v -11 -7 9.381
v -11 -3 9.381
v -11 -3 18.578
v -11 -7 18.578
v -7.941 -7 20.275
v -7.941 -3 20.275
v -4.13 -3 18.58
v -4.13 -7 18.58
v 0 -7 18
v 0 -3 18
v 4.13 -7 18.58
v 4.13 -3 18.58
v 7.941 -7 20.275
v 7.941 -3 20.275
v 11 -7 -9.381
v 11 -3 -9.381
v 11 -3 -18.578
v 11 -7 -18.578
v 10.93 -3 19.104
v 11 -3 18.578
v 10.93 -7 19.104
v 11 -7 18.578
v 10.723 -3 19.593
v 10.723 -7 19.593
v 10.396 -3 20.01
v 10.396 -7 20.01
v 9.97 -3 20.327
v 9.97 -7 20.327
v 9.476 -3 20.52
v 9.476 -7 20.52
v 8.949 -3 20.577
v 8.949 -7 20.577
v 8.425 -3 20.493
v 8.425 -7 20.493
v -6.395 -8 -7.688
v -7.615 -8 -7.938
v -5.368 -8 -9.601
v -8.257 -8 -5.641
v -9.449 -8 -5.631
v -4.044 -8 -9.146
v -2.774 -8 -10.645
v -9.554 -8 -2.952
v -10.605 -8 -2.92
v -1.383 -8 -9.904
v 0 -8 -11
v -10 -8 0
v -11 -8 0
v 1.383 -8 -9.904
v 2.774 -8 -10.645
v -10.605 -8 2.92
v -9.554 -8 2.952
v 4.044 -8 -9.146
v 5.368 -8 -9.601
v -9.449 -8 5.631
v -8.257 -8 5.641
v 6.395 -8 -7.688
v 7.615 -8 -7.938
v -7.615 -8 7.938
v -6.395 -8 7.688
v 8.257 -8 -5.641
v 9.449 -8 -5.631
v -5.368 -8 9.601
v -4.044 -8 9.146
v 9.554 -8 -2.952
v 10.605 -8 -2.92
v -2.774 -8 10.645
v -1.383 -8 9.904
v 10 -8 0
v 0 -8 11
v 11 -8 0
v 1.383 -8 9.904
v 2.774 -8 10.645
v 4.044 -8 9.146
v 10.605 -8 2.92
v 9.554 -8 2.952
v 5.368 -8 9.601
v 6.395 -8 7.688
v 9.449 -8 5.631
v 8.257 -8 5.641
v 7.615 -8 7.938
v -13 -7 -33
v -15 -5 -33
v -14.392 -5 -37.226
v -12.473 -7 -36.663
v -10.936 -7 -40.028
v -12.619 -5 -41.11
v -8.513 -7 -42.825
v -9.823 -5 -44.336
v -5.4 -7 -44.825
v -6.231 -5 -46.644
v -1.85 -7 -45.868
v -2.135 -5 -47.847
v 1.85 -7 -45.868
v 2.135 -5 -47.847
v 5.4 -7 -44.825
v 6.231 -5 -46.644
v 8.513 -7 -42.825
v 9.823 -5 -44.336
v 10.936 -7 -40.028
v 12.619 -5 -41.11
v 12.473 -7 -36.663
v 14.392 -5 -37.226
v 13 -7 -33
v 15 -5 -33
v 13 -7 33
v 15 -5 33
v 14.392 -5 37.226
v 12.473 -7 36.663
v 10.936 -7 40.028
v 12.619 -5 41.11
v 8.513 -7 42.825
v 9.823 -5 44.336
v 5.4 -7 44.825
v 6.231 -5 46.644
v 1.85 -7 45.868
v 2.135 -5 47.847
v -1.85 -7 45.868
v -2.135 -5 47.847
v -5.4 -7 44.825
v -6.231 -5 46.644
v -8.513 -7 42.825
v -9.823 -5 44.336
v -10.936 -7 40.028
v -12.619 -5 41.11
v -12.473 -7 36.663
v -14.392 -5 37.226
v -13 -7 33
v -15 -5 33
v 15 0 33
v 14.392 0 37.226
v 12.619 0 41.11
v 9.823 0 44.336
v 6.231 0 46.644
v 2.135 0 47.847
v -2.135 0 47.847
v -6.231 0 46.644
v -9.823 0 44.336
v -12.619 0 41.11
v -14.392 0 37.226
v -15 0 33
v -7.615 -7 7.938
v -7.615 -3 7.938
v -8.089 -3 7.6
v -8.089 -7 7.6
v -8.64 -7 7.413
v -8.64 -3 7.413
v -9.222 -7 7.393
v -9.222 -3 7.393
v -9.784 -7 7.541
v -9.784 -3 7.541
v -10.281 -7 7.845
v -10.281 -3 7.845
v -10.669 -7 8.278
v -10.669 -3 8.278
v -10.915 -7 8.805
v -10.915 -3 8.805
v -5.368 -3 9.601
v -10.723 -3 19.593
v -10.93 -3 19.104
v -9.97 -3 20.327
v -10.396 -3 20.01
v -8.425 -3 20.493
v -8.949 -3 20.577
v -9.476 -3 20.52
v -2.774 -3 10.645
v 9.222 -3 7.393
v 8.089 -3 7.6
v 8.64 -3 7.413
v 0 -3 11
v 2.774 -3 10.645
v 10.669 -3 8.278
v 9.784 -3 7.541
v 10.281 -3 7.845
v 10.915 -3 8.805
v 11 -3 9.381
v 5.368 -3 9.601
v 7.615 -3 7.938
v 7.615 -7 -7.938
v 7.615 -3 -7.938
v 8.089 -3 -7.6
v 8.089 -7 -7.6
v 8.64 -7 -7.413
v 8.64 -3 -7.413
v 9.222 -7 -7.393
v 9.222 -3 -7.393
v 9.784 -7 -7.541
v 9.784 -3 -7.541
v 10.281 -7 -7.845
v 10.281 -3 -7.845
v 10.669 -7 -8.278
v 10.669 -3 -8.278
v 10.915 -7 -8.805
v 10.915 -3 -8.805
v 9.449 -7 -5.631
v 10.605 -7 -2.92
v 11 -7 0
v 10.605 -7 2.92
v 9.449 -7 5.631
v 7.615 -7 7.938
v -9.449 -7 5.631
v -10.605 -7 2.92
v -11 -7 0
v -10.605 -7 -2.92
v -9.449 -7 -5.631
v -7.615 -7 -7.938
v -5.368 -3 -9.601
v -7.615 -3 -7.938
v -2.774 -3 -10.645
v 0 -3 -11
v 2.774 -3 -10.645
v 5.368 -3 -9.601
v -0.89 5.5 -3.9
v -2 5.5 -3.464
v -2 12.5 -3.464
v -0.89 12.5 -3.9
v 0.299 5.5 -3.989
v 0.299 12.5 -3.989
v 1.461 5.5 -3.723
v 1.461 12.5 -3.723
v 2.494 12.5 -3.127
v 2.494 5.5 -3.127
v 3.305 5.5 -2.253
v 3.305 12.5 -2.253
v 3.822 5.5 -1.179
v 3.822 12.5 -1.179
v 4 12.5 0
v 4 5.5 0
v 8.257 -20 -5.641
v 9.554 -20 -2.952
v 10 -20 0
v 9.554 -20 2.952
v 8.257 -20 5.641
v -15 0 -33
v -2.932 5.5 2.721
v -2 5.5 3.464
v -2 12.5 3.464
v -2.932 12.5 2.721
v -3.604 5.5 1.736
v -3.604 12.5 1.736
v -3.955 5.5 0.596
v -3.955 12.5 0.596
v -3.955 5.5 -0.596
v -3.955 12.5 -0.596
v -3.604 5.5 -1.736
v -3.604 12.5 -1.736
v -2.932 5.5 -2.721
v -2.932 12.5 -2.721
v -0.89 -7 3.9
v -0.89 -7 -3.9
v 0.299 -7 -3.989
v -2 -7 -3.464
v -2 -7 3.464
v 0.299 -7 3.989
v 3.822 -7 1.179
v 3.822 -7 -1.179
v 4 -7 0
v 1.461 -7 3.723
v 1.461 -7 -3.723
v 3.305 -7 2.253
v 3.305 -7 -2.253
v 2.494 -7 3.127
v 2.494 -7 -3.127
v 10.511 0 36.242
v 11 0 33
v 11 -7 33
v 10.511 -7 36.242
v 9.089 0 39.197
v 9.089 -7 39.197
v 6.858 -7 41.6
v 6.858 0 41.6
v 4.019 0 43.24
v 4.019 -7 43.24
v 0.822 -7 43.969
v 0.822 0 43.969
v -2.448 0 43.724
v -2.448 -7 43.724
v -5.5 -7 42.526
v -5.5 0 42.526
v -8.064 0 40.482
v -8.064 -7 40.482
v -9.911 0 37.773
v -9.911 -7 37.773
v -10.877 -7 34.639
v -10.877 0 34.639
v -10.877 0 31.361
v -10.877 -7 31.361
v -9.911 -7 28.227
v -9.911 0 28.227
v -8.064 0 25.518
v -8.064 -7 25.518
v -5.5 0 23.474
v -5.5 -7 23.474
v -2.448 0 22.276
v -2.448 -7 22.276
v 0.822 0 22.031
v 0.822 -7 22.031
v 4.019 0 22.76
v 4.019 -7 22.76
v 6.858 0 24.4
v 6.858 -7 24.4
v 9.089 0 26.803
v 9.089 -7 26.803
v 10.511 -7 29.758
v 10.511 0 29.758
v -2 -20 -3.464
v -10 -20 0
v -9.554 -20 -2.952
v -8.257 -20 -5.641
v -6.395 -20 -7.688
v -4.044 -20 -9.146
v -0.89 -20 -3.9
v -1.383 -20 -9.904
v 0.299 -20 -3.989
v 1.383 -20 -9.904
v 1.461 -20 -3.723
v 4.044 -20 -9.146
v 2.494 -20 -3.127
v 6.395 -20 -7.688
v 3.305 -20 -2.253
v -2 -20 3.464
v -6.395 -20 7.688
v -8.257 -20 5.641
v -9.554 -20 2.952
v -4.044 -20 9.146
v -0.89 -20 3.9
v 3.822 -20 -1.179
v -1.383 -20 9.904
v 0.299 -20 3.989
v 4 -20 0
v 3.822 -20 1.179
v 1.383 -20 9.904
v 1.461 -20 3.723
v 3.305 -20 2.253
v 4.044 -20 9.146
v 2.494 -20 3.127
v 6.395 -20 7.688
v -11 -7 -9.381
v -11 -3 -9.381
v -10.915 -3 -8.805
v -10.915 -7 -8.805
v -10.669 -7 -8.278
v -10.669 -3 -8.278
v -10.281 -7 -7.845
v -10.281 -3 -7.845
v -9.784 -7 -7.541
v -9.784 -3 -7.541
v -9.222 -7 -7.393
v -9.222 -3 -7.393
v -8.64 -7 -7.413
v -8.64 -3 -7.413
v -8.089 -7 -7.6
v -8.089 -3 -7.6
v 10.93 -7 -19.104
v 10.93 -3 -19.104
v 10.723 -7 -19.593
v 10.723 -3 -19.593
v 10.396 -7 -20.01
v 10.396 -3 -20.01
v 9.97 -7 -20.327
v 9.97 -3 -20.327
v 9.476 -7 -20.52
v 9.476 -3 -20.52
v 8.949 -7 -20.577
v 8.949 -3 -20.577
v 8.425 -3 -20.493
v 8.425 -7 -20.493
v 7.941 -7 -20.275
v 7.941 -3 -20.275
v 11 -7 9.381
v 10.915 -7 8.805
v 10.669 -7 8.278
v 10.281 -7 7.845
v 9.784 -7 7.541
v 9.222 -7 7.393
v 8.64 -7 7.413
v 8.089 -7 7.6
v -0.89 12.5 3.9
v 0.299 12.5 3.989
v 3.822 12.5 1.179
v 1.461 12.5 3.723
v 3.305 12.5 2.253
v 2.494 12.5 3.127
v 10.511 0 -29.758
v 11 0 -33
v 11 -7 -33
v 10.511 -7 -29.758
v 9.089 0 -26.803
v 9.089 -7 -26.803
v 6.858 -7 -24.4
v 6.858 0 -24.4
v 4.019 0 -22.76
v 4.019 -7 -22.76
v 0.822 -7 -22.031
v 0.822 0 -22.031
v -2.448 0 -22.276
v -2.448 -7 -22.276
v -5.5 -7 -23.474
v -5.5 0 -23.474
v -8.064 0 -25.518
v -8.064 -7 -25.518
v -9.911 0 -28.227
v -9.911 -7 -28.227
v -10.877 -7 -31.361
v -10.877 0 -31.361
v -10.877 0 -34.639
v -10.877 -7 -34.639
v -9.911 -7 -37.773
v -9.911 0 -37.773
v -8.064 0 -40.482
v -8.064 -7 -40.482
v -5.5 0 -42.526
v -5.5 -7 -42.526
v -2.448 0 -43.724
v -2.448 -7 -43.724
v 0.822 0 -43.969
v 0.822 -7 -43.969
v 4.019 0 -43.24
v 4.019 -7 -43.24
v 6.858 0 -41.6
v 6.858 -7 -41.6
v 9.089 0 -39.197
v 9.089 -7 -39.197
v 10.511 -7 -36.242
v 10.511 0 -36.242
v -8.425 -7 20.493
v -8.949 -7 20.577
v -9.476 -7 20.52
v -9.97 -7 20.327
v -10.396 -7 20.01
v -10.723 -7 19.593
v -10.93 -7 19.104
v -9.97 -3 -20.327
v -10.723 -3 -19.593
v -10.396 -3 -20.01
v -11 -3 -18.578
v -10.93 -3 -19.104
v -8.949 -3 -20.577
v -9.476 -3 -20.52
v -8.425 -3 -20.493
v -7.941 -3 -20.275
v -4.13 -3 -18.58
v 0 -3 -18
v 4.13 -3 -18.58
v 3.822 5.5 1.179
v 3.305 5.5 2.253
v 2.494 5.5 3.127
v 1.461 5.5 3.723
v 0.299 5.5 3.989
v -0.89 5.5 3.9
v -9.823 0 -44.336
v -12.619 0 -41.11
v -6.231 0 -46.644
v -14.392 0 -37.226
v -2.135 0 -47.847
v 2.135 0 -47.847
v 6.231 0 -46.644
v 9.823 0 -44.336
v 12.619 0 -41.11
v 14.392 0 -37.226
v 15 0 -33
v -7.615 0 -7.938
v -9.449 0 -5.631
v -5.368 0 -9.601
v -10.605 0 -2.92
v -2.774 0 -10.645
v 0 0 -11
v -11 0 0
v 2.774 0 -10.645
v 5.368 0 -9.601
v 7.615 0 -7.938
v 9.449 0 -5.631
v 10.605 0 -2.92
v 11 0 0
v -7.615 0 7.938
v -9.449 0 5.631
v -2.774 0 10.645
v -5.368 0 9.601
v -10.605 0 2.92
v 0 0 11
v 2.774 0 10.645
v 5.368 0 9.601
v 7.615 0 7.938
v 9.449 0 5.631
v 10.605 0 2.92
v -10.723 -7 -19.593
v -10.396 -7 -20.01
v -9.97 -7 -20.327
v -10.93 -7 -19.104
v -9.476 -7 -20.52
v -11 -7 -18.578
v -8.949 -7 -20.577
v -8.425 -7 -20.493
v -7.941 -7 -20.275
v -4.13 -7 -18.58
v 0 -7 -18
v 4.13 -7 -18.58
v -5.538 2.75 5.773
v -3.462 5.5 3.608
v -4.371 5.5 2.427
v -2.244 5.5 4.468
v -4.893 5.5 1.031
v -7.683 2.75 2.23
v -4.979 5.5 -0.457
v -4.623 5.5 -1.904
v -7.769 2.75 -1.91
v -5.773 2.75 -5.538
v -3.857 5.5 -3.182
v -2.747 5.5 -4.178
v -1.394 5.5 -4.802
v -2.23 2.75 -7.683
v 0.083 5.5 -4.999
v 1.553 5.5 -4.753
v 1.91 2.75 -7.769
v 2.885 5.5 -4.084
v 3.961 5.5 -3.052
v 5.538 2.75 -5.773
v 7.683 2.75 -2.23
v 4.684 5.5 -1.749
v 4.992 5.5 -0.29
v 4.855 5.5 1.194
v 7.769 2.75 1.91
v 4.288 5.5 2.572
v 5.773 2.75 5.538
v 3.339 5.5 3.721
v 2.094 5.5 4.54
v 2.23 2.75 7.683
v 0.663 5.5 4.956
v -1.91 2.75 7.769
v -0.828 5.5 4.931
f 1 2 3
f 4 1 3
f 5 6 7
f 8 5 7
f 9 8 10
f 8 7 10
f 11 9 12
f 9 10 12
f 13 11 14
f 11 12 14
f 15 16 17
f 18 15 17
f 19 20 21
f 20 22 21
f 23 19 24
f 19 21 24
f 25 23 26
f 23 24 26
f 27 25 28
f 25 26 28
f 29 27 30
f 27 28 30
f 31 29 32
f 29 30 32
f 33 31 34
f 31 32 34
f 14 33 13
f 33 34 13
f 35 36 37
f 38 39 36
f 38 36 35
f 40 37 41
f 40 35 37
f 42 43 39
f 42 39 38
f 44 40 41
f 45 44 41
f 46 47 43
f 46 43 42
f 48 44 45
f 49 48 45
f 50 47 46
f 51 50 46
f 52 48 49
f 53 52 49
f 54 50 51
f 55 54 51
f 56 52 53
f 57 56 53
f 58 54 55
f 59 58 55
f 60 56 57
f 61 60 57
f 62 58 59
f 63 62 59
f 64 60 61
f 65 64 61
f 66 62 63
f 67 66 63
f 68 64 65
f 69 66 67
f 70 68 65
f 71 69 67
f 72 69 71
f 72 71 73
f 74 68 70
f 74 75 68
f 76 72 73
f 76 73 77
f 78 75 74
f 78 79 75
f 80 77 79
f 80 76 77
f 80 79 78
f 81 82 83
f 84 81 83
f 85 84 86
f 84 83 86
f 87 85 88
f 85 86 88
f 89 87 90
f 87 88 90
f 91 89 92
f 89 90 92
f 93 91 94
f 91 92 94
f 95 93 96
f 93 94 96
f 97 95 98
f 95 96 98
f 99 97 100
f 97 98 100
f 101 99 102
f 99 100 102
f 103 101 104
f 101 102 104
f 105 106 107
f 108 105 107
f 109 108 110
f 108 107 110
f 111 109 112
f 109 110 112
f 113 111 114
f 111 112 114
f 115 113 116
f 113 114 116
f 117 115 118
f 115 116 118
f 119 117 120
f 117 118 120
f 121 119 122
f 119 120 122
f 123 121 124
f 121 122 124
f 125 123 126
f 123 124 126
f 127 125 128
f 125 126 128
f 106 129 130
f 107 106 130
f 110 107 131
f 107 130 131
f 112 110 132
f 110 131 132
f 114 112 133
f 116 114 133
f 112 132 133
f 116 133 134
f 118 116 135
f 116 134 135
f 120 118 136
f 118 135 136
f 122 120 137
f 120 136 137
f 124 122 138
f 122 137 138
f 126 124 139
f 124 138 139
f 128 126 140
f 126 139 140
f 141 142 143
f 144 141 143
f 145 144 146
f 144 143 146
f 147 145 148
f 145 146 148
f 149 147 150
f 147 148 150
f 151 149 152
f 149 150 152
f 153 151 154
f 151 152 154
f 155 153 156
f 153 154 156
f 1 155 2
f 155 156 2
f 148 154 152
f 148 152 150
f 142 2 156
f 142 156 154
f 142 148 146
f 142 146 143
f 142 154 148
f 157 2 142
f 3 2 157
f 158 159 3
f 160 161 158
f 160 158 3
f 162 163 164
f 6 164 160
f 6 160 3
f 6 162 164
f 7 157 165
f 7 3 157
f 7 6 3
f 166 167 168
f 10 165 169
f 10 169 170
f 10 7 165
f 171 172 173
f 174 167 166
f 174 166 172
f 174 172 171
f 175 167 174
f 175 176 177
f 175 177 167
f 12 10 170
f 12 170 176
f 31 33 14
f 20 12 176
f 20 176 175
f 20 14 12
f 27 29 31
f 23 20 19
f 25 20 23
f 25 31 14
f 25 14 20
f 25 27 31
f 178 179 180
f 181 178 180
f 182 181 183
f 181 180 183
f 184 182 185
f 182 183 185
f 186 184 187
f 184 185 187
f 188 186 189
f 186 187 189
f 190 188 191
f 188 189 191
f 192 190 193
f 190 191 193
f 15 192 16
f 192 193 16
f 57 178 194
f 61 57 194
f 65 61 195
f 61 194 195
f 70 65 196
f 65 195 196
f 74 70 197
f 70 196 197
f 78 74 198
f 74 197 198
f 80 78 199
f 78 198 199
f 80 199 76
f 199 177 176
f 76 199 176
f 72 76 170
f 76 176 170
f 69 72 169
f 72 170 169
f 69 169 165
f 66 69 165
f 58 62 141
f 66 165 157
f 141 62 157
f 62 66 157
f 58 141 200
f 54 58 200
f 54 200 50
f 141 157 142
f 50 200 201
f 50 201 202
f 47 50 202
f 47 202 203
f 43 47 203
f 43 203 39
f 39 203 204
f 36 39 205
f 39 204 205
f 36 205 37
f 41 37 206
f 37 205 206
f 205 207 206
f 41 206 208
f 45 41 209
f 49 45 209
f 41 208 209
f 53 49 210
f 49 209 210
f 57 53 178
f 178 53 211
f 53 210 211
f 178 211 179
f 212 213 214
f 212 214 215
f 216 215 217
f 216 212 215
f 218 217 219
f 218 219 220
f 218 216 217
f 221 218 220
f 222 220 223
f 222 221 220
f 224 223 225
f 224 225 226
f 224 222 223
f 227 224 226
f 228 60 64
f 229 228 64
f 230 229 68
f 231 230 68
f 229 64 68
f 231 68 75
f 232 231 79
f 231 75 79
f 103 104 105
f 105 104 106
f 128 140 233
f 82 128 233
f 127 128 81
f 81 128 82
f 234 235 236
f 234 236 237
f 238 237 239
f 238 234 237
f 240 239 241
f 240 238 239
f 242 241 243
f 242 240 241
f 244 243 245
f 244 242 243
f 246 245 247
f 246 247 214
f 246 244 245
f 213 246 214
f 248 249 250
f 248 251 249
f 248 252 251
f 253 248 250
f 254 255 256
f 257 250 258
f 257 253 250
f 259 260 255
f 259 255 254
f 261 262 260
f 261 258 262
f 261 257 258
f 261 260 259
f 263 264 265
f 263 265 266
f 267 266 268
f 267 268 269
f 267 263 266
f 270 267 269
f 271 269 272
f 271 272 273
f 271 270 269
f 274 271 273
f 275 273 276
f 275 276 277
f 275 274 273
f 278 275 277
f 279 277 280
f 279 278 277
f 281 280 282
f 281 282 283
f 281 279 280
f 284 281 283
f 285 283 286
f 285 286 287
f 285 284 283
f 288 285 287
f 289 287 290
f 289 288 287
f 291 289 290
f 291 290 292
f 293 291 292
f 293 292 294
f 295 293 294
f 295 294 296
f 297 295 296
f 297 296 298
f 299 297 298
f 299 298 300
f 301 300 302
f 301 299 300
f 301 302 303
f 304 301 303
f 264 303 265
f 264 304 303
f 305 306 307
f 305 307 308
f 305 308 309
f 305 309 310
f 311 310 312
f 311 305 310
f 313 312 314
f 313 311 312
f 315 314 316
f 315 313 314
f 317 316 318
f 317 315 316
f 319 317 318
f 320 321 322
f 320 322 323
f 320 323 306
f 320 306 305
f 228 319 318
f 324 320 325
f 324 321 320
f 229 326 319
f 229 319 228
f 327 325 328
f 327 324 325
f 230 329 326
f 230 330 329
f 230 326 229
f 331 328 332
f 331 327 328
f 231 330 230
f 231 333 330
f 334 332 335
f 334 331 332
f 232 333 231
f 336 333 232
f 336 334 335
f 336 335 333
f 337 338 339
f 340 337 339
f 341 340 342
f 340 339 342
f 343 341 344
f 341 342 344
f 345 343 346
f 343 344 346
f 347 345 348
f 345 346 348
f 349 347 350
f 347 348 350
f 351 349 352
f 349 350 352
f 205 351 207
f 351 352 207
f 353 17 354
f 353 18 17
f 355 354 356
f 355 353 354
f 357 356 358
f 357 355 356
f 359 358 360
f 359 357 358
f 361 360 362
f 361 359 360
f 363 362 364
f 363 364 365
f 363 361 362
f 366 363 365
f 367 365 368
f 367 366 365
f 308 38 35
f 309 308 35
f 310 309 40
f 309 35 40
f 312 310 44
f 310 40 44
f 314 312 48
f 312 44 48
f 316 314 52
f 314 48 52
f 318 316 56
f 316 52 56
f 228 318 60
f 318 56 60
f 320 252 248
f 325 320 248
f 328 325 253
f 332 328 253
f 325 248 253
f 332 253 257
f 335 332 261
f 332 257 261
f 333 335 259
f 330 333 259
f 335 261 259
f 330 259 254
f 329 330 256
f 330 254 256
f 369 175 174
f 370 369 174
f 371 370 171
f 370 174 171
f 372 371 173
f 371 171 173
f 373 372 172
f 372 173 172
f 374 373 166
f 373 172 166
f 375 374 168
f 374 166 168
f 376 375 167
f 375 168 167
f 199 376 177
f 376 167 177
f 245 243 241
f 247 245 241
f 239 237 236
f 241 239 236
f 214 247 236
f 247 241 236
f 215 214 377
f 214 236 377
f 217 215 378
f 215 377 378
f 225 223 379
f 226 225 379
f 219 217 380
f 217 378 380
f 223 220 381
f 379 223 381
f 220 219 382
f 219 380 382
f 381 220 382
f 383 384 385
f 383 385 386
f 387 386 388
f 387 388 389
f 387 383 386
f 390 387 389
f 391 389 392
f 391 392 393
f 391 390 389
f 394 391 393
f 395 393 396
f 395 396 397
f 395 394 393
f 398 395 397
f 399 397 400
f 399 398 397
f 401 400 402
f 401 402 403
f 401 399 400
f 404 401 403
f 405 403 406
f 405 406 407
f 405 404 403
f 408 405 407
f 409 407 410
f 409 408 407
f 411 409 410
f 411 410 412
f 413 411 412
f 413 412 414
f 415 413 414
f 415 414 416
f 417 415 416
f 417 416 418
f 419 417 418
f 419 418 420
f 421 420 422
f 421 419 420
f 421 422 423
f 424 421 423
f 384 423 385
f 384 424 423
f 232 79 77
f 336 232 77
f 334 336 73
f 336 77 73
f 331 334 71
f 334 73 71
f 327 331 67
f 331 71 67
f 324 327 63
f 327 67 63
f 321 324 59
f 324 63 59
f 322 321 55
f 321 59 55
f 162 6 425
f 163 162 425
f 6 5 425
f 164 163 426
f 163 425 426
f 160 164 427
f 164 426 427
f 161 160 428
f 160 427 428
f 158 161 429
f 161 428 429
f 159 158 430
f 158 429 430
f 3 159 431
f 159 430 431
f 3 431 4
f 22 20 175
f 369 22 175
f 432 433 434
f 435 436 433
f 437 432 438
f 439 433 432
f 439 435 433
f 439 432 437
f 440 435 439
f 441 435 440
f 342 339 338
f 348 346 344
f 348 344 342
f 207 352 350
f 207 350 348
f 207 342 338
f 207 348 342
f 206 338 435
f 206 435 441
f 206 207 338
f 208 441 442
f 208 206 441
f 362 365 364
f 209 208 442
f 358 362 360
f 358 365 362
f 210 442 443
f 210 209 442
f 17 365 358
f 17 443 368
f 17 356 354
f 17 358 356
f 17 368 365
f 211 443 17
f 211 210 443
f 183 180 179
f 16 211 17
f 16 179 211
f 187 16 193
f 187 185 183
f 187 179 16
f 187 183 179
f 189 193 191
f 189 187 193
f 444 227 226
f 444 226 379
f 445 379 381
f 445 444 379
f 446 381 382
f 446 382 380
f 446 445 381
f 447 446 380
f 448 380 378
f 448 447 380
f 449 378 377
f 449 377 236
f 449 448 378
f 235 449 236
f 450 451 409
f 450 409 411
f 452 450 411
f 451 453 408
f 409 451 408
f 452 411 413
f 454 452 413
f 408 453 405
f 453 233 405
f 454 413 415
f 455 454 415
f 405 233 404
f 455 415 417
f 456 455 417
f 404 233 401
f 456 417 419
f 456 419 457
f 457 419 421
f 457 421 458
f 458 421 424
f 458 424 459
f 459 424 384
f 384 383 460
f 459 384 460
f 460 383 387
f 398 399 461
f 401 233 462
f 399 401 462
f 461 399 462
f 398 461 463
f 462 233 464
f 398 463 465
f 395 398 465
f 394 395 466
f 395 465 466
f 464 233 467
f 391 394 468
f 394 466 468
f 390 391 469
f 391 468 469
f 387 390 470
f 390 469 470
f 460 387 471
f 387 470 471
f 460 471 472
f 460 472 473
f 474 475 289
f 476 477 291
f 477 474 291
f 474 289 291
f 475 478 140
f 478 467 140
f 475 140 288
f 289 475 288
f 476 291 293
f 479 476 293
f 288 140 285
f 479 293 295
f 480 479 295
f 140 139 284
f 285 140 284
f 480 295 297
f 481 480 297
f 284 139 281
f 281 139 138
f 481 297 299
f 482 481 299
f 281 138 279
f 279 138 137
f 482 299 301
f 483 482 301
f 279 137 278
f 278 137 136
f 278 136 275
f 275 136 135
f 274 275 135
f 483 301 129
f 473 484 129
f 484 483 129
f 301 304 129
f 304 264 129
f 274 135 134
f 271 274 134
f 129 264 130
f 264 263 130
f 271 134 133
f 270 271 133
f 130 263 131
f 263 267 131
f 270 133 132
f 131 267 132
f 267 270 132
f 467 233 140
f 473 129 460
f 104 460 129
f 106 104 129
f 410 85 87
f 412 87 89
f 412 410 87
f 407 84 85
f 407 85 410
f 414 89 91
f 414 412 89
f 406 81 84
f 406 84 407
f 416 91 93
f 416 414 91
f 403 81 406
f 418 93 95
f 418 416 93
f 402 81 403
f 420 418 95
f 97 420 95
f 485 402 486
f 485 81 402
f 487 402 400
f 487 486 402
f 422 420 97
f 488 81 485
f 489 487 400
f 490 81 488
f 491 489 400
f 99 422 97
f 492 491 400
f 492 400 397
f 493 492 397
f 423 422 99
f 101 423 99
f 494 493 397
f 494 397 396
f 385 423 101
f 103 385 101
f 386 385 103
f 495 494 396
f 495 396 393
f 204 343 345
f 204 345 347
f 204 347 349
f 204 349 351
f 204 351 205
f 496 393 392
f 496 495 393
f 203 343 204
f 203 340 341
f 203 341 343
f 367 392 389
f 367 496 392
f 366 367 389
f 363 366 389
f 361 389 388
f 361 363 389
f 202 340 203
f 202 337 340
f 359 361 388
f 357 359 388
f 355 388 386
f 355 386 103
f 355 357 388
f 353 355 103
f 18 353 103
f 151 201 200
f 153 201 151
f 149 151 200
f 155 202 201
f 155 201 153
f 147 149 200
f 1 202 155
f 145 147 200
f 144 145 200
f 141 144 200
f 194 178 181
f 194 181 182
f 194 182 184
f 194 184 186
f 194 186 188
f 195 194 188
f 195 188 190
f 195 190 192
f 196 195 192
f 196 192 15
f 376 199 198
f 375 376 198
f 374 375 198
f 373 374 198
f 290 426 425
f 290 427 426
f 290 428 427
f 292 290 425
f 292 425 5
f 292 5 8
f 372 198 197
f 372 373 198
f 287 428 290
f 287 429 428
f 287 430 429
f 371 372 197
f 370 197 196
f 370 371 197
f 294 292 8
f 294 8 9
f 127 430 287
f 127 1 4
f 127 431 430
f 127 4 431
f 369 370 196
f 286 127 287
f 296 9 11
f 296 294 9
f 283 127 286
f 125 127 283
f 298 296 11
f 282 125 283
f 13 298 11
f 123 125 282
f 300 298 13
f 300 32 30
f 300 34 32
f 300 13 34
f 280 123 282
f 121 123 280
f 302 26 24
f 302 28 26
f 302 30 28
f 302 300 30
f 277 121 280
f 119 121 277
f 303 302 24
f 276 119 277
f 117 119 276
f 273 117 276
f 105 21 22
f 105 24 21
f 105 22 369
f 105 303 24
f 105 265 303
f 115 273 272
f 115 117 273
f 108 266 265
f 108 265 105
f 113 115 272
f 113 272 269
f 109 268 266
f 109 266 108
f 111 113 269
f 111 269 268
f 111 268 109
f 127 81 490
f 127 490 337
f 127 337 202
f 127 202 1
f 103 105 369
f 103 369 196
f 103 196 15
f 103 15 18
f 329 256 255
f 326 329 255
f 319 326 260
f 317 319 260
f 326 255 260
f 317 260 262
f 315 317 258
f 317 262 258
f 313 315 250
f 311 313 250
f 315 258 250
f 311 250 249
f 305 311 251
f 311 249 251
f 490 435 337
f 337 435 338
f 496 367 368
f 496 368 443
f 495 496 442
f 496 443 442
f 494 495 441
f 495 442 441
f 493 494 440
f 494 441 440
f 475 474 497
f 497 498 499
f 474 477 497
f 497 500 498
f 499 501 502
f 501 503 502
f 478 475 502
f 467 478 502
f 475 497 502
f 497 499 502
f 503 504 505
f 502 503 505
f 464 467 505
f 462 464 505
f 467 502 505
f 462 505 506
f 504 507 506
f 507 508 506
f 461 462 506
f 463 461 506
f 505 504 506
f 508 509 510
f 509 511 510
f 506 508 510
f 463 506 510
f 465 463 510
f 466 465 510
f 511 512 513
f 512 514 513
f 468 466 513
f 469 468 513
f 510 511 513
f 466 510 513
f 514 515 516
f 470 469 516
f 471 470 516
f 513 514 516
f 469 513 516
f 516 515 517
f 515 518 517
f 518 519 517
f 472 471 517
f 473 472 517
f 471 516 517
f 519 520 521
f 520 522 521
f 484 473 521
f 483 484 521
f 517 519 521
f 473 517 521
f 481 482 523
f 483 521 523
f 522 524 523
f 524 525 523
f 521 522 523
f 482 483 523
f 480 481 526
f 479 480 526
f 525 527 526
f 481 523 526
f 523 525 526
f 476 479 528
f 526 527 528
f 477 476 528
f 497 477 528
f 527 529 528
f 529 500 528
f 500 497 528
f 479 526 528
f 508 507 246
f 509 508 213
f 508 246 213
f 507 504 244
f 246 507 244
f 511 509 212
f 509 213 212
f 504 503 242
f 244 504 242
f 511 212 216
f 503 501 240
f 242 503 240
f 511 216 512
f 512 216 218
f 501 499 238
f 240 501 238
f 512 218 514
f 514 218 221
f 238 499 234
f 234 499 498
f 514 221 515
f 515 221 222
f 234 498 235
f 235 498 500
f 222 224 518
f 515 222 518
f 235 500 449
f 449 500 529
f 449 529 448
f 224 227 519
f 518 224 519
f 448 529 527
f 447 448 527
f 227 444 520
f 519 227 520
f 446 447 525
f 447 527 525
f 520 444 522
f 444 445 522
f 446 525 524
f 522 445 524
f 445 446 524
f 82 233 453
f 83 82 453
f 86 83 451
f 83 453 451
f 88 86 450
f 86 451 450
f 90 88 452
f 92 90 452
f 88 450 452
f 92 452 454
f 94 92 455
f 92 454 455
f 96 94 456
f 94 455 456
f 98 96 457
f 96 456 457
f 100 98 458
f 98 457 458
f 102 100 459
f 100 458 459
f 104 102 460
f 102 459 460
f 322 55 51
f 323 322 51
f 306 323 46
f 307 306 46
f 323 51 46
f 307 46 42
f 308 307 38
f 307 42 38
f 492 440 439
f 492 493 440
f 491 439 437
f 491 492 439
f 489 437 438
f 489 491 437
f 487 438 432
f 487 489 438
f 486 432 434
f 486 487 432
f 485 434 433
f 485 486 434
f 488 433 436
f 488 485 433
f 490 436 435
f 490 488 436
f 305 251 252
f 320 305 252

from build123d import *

# Parameters (mm, degrees)
F0_R          = 11
F1_DEPTH      = 7
F2_DEPTH      = 20
F3_DEPTH      = 3
F3_DEPTH_BACK = 12.5
F4_DEPTH      = 3
F5_R          = 2
F6_DEPTH      = 5.5
F8_DEPTH      = 8
F9_SIZE       = 2


# Not quite as in the source:
# - a fillet or chamfer that OpenCascade refuses, or shapes differently, is made with other operations: its cross-section is extruded or revolved along the edge and cut away or added


with BuildPart() as f1:
    # F0 (on Front) → F1 (new body)
    with BuildSketch(Plane.XZ):
        with BuildLine():
            ThreePointArc((11, 22.8019609728), (13.9642400438, 27.5227744249), (15, 33))
            ThreePointArc((15, 33), (0, 48), (-15, 33))
            ThreePointArc((-15, 33), (-13.9642400438, 27.5227744249), (-11, 22.8019609728))
            ThreePointArc((-11, 22.8019609728), (0, 18), (11, 22.8019609728))
        make_face()
        with Locations((0, 33)):
            Circle(F0_R, mode=Mode.SUBTRACT)
        with BuildLine():
            ThreePointArc((-15, -33), (0, -48), (15, -33))
            ThreePointArc((15, -33), (13.9642400438, -27.5227744249), (11, -22.8019609728))
            ThreePointArc((11, -22.8019609728), (0, -18), (-11, -22.8019609728))
            ThreePointArc((-11, -22.8019609728), (-13.9642400438, -27.5227744249), (-15, -33))
        make_face()
        with Locations((0, -33)):
            Circle(F0_R, mode=Mode.SUBTRACT)
        with BuildLine():
            ThreePointArc((-11, 22.8019609728), (-13.9642400438, 27.5227744249), (-15, 33))
            Line((-15, 33), (-15, -33))
            ThreePointArc((-15, -33), (-13.9642400438, -27.5227744249), (-11, -22.8019609728))
            Line((-11, -22.8019609728), (-11, -9.3808315196))
            ThreePointArc((-11, -9.3808315196), (-9.7844645406, -7.5410990976), (-7.6153846154, -7.9376266705))
            ThreePointArc((-7.6153846154, -7.9376266705), (-11, 0), (-7.6153846154, 7.9376266705))
            ThreePointArc((-7.6153846154, 7.9376266705), (-9.7844645406, 7.5410990976), (-11, 9.3808315196))
            Line((-11, 9.3808315196), (-11, 22.8019609728))
        make_face()
        with BuildLine():
            Line((15, -33), (15, 33))
            ThreePointArc((15, 33), (13.9642400438, 27.5227744249), (11, 22.8019609728))
            Line((11, 22.8019609728), (11, 9.3808315196))
            ThreePointArc((11, 9.3808315196), (9.7844645406, 7.5410990976), (7.6153846154, 7.9376266705))
            ThreePointArc((7.6153846154, 7.9376266705), (10.1185283211, 4.314554973), (11, 0))
            ThreePointArc((11, 0), (10.1185283211, -4.314554973), (7.6153846154, -7.9376266705))
            ThreePointArc((7.6153846154, -7.9376266705), (9.7844645406, -7.5410990976), (11, -9.3808315196))
            Line((11, -9.3808315196), (11, -22.8019609728))
            ThreePointArc((11, -22.8019609728), (13.9642400438, -27.5227744249), (15, -33))
        make_face()
        with BuildLine():
            ThreePointArc((11, 0), (10.1185283211, 4.314554973), (7.6153846154, 7.9376266705))
            ThreePointArc((7.6153846154, 7.9376266705), (0, 11), (-7.6153846154, 7.9376266705))
            ThreePointArc((-7.6153846154, 7.9376266705), (-11, 0), (-7.6153846154, -7.9376266705))
            ThreePointArc((-7.6153846154, -7.9376266705), (0, -11), (7.6153846154, -7.9376266705))
            ThreePointArc((7.6153846154, -7.9376266705), (10.1185283211, -4.314554973), (11, 0))
        make_face()
        with BuildLine():
            ThreePointArc((-8.2567722168, 5.6414282376), (0, 10), (8.2567722168, 5.6414282376))
            ThreePointArc((8.2567722168, 5.6414282376), (10, 0), (8.2567722168, -5.6414282376))
            ThreePointArc((8.2567722168, -5.6414282376), (0, -10), (-8.2567722168, -5.6414282376))
            ThreePointArc((-8.2567722168, -5.6414282376), (-10, 0), (-8.2567722168, 5.6414282376))
        make_face(mode=Mode.SUBTRACT)
        with BuildLine():
            ThreePointArc((8.2567722168, -5.6414282376), (10, 0), (8.2567722168, 5.6414282376))
            ThreePointArc((8.2567722168, 5.6414282376), (0, 10), (-8.2567722168, 5.6414282376))
            ThreePointArc((-8.2567722168, 5.6414282376), (-10, 0), (-8.2567722168, -5.6414282376))
            ThreePointArc((-8.2567722168, -5.6414282376), (0, -10), (8.2567722168, -5.6414282376))
        make_face()
        with BuildLine():
            ThreePointArc((-2, 3.4641016151), (2, 3.4641016151), (4, 0))
            ThreePointArc((4, 0), (2, -3.4641016151), (-2, -3.4641016151))
            ThreePointArc((-2, -3.4641016151), (-4, 0), (-2, 3.4641016151))
        make_face(mode=Mode.SUBTRACT)
        with BuildLine():
            Line((-2, -3.4641016151), (-2, 3.4641016151))
            ThreePointArc((-2, 3.4641016151), (-4, 0), (-2, -3.4641016151))
        make_face()
        with BuildLine():
            ThreePointArc((-2, -3.4641016151), (2, -3.4641016151), (4, 0))
            ThreePointArc((4, 0), (2, 3.4641016151), (-2, 3.4641016151))
            Line((-2, 3.4641016151), (-2, -3.4641016151))
        make_face()
    extrude(amount=F1_DEPTH)

    # F0 (on Front) → F2 (join)
    with BuildSketch(Plane.XZ):
        with BuildLine():
            ThreePointArc((8.2567722168, -5.6414282376), (10, 0), (8.2567722168, 5.6414282376))
            ThreePointArc((8.2567722168, 5.6414282376), (0, 10), (-8.2567722168, 5.6414282376))
            ThreePointArc((-8.2567722168, 5.6414282376), (-10, 0), (-8.2567722168, -5.6414282376))
            ThreePointArc((-8.2567722168, -5.6414282376), (0, -10), (8.2567722168, -5.6414282376))
        make_face()
        with BuildLine():
            ThreePointArc((-2, 3.4641016151), (2, 3.4641016151), (4, 0))
            ThreePointArc((4, 0), (2, -3.4641016151), (-2, -3.4641016151))
            ThreePointArc((-2, -3.4641016151), (-4, 0), (-2, 3.4641016151))
        make_face(mode=Mode.SUBTRACT)
        with BuildLine():
            Line((-2, -3.4641016151), (-2, 3.4641016151))
            ThreePointArc((-2, 3.4641016151), (-4, 0), (-2, -3.4641016151))
        make_face()
    extrude(amount=F2_DEPTH)

    # F0 (on Front) → F3 (join, two sides)
    with BuildSketch(Plane.XZ) as f3_sk:
        with BuildLine():
            Line((-2, -3.4641016151), (-2, 3.4641016151))
            ThreePointArc((-2, 3.4641016151), (-4, 0), (-2, -3.4641016151))
        make_face()
        with BuildLine():
            ThreePointArc((-2, -3.4641016151), (2, -3.4641016151), (4, 0))
            ThreePointArc((4, 0), (2, 3.4641016151), (-2, 3.4641016151))
            Line((-2, 3.4641016151), (-2, -3.4641016151))
        make_face()
    extrude(amount=F3_DEPTH)
    extrude(f3_sk.sketch, amount=-F3_DEPTH_BACK)

    # F0 (on Front) → F4 (join)
    with BuildSketch(Plane.XZ):
        with BuildLine():
            Line((11, 9.3808315196), (11, 22.8019609728))
            ThreePointArc((11, 22.8019609728), (0, 18), (-11, 22.8019609728))
            Line((-11, 22.8019609728), (-11, 9.3808315196))
            ThreePointArc((-11, 9.3808315196), (-9.7844645406, 7.5410990976), (-7.6153846154, 7.9376266705))
            ThreePointArc((-7.6153846154, 7.9376266705), (0, 11), (7.6153846154, 7.9376266705))
            ThreePointArc((7.6153846154, 7.9376266705), (9.7844645406, 7.5410990976), (11, 9.3808315196))
        make_face()
        with BuildLine():
            ThreePointArc((-11, -22.8019609728), (0, -18), (11, -22.8019609728))
            Line((11, -22.8019609728), (11, -9.3808315196))
            ThreePointArc((11, -9.3808315196), (9.7844645406, -7.5410990976), (7.6153846154, -7.9376266705))
            ThreePointArc((7.6153846154, -7.9376266705), (0, -11), (-7.6153846154, -7.9376266705))
            ThreePointArc((-7.6153846154, -7.9376266705), (-9.7844645406, -7.5410990976), (-11, -9.3808315196))
            Line((-11, -9.3808315196), (-11, -22.8019609728))
        make_face()
        with BuildLine():
            ThreePointArc((11, 0), (10.1185283211, 4.314554973), (7.6153846154, 7.9376266705))
            ThreePointArc((7.6153846154, 7.9376266705), (0, 11), (-7.6153846154, 7.9376266705))
            ThreePointArc((-7.6153846154, 7.9376266705), (-11, 0), (-7.6153846154, -7.9376266705))
            ThreePointArc((-7.6153846154, -7.9376266705), (0, -11), (7.6153846154, -7.9376266705))
            ThreePointArc((7.6153846154, -7.9376266705), (10.1185283211, -4.314554973), (11, 0))
        make_face()
        with BuildLine():
            ThreePointArc((-8.2567722168, 5.6414282376), (0, 10), (8.2567722168, 5.6414282376))
            ThreePointArc((8.2567722168, 5.6414282376), (10, 0), (8.2567722168, -5.6414282376))
            ThreePointArc((8.2567722168, -5.6414282376), (0, -10), (-8.2567722168, -5.6414282376))
            ThreePointArc((-8.2567722168, -5.6414282376), (-10, 0), (-8.2567722168, 5.6414282376))
        make_face(mode=Mode.SUBTRACT)
    extrude(amount=F4_DEPTH)

    # F5
    f5_edges = [f1.edges().sort_by_distance(p)[0] for p in [
        (-11, -5, -22.801961),
        (11, -5, -22.801961),
        (11, -5, 22.801961),
        (-11, -5, 22.801961),
    ]]
    fillet(f5_edges, radius=F5_R)

    # F0 (on Front) → F6 (join)
    with BuildSketch(Plane.XZ):
        with BuildLine():
            ThreePointArc((11, 0), (10.1185283211, 4.314554973), (7.6153846154, 7.9376266705))
            ThreePointArc((7.6153846154, 7.9376266705), (0, 11), (-7.6153846154, 7.9376266705))
            ThreePointArc((-7.6153846154, 7.9376266705), (-11, 0), (-7.6153846154, -7.9376266705))
            ThreePointArc((-7.6153846154, -7.9376266705), (0, -11), (7.6153846154, -7.9376266705))
            ThreePointArc((7.6153846154, -7.9376266705), (10.1185283211, -4.314554973), (11, 0))
        make_face()
        with BuildLine():
            ThreePointArc((-8.2567722168, 5.6414282376), (0, 10), (8.2567722168, 5.6414282376))
            ThreePointArc((8.2567722168, 5.6414282376), (10, 0), (8.2567722168, -5.6414282376))
            ThreePointArc((8.2567722168, -5.6414282376), (0, -10), (-8.2567722168, -5.6414282376))
            ThreePointArc((-8.2567722168, -5.6414282376), (-10, 0), (-8.2567722168, 5.6414282376))
        make_face(mode=Mode.SUBTRACT)
        with BuildLine():
            ThreePointArc((8.2567722168, -5.6414282376), (10, 0), (8.2567722168, 5.6414282376))
            ThreePointArc((8.2567722168, 5.6414282376), (0, 10), (-8.2567722168, 5.6414282376))
            ThreePointArc((-8.2567722168, 5.6414282376), (-10, 0), (-8.2567722168, -5.6414282376))
            ThreePointArc((-8.2567722168, -5.6414282376), (0, -10), (8.2567722168, -5.6414282376))
        make_face()
        with BuildLine():
            ThreePointArc((-2, 3.4641016151), (2, 3.4641016151), (4, 0))
            ThreePointArc((4, 0), (2, -3.4641016151), (-2, -3.4641016151))
            ThreePointArc((-2, -3.4641016151), (-4, 0), (-2, 3.4641016151))
        make_face(mode=Mode.SUBTRACT)
    extrude(amount=-F6_DEPTH)

    # F7: chamfer of 5.5 x 6 on 1 edges, made by hand


with BuildPart() as f7_tool2:
    # F7_s3 → F7_t4 (revolve)
    with BuildSketch(Plane(origin=(0, 0, 0), x_dir=(0, 1, 0), z_dir=(0.7216024246, 0, 0.6923076923))):
        Polygon((0, 11), (5.5, 5), (5.5, 11), align=None)
    revolve(axis=Axis((0, 5.5, 0), (0, -1, 0)))

    split(bisect_by=Plane.XZ, keep=Keep.BOTTOM)


with BuildPart() as f1_1:
    add(f1.part)

    # F7_t1: cut F7_tool2
    add(f7_tool2.part, mode=Mode.SUBTRACT)

    # F0 (on Front) → F8 (join)
    with BuildSketch(Plane.XZ):
        with BuildLine():
            ThreePointArc((11, 0), (10.1185283211, 4.314554973), (7.6153846154, 7.9376266705))
            ThreePointArc((7.6153846154, 7.9376266705), (0, 11), (-7.6153846154, 7.9376266705))
            ThreePointArc((-7.6153846154, 7.9376266705), (-11, 0), (-7.6153846154, -7.9376266705))
            ThreePointArc((-7.6153846154, -7.9376266705), (0, -11), (7.6153846154, -7.9376266705))
            ThreePointArc((7.6153846154, -7.9376266705), (10.1185283211, -4.314554973), (11, 0))
        make_face()
        with BuildLine():
            ThreePointArc((-8.2567722168, 5.6414282376), (0, 10), (8.2567722168, 5.6414282376))
            ThreePointArc((8.2567722168, 5.6414282376), (10, 0), (8.2567722168, -5.6414282376))
            ThreePointArc((8.2567722168, -5.6414282376), (0, -10), (-8.2567722168, -5.6414282376))
            ThreePointArc((-8.2567722168, -5.6414282376), (-10, 0), (-8.2567722168, 5.6414282376))
        make_face(mode=Mode.SUBTRACT)
    extrude(amount=F8_DEPTH)

    # F9
    f9_edges = [f1_1.edges().sort_by_distance(p)[0] for p in [
        (0, -7, 48),
        (15, -7, 0),
        (-15, -7, 0),
        (0, -7, -48),
    ]]
    chamfer(f9_edges, length=F9_SIZE)


solid = f1_1.part
